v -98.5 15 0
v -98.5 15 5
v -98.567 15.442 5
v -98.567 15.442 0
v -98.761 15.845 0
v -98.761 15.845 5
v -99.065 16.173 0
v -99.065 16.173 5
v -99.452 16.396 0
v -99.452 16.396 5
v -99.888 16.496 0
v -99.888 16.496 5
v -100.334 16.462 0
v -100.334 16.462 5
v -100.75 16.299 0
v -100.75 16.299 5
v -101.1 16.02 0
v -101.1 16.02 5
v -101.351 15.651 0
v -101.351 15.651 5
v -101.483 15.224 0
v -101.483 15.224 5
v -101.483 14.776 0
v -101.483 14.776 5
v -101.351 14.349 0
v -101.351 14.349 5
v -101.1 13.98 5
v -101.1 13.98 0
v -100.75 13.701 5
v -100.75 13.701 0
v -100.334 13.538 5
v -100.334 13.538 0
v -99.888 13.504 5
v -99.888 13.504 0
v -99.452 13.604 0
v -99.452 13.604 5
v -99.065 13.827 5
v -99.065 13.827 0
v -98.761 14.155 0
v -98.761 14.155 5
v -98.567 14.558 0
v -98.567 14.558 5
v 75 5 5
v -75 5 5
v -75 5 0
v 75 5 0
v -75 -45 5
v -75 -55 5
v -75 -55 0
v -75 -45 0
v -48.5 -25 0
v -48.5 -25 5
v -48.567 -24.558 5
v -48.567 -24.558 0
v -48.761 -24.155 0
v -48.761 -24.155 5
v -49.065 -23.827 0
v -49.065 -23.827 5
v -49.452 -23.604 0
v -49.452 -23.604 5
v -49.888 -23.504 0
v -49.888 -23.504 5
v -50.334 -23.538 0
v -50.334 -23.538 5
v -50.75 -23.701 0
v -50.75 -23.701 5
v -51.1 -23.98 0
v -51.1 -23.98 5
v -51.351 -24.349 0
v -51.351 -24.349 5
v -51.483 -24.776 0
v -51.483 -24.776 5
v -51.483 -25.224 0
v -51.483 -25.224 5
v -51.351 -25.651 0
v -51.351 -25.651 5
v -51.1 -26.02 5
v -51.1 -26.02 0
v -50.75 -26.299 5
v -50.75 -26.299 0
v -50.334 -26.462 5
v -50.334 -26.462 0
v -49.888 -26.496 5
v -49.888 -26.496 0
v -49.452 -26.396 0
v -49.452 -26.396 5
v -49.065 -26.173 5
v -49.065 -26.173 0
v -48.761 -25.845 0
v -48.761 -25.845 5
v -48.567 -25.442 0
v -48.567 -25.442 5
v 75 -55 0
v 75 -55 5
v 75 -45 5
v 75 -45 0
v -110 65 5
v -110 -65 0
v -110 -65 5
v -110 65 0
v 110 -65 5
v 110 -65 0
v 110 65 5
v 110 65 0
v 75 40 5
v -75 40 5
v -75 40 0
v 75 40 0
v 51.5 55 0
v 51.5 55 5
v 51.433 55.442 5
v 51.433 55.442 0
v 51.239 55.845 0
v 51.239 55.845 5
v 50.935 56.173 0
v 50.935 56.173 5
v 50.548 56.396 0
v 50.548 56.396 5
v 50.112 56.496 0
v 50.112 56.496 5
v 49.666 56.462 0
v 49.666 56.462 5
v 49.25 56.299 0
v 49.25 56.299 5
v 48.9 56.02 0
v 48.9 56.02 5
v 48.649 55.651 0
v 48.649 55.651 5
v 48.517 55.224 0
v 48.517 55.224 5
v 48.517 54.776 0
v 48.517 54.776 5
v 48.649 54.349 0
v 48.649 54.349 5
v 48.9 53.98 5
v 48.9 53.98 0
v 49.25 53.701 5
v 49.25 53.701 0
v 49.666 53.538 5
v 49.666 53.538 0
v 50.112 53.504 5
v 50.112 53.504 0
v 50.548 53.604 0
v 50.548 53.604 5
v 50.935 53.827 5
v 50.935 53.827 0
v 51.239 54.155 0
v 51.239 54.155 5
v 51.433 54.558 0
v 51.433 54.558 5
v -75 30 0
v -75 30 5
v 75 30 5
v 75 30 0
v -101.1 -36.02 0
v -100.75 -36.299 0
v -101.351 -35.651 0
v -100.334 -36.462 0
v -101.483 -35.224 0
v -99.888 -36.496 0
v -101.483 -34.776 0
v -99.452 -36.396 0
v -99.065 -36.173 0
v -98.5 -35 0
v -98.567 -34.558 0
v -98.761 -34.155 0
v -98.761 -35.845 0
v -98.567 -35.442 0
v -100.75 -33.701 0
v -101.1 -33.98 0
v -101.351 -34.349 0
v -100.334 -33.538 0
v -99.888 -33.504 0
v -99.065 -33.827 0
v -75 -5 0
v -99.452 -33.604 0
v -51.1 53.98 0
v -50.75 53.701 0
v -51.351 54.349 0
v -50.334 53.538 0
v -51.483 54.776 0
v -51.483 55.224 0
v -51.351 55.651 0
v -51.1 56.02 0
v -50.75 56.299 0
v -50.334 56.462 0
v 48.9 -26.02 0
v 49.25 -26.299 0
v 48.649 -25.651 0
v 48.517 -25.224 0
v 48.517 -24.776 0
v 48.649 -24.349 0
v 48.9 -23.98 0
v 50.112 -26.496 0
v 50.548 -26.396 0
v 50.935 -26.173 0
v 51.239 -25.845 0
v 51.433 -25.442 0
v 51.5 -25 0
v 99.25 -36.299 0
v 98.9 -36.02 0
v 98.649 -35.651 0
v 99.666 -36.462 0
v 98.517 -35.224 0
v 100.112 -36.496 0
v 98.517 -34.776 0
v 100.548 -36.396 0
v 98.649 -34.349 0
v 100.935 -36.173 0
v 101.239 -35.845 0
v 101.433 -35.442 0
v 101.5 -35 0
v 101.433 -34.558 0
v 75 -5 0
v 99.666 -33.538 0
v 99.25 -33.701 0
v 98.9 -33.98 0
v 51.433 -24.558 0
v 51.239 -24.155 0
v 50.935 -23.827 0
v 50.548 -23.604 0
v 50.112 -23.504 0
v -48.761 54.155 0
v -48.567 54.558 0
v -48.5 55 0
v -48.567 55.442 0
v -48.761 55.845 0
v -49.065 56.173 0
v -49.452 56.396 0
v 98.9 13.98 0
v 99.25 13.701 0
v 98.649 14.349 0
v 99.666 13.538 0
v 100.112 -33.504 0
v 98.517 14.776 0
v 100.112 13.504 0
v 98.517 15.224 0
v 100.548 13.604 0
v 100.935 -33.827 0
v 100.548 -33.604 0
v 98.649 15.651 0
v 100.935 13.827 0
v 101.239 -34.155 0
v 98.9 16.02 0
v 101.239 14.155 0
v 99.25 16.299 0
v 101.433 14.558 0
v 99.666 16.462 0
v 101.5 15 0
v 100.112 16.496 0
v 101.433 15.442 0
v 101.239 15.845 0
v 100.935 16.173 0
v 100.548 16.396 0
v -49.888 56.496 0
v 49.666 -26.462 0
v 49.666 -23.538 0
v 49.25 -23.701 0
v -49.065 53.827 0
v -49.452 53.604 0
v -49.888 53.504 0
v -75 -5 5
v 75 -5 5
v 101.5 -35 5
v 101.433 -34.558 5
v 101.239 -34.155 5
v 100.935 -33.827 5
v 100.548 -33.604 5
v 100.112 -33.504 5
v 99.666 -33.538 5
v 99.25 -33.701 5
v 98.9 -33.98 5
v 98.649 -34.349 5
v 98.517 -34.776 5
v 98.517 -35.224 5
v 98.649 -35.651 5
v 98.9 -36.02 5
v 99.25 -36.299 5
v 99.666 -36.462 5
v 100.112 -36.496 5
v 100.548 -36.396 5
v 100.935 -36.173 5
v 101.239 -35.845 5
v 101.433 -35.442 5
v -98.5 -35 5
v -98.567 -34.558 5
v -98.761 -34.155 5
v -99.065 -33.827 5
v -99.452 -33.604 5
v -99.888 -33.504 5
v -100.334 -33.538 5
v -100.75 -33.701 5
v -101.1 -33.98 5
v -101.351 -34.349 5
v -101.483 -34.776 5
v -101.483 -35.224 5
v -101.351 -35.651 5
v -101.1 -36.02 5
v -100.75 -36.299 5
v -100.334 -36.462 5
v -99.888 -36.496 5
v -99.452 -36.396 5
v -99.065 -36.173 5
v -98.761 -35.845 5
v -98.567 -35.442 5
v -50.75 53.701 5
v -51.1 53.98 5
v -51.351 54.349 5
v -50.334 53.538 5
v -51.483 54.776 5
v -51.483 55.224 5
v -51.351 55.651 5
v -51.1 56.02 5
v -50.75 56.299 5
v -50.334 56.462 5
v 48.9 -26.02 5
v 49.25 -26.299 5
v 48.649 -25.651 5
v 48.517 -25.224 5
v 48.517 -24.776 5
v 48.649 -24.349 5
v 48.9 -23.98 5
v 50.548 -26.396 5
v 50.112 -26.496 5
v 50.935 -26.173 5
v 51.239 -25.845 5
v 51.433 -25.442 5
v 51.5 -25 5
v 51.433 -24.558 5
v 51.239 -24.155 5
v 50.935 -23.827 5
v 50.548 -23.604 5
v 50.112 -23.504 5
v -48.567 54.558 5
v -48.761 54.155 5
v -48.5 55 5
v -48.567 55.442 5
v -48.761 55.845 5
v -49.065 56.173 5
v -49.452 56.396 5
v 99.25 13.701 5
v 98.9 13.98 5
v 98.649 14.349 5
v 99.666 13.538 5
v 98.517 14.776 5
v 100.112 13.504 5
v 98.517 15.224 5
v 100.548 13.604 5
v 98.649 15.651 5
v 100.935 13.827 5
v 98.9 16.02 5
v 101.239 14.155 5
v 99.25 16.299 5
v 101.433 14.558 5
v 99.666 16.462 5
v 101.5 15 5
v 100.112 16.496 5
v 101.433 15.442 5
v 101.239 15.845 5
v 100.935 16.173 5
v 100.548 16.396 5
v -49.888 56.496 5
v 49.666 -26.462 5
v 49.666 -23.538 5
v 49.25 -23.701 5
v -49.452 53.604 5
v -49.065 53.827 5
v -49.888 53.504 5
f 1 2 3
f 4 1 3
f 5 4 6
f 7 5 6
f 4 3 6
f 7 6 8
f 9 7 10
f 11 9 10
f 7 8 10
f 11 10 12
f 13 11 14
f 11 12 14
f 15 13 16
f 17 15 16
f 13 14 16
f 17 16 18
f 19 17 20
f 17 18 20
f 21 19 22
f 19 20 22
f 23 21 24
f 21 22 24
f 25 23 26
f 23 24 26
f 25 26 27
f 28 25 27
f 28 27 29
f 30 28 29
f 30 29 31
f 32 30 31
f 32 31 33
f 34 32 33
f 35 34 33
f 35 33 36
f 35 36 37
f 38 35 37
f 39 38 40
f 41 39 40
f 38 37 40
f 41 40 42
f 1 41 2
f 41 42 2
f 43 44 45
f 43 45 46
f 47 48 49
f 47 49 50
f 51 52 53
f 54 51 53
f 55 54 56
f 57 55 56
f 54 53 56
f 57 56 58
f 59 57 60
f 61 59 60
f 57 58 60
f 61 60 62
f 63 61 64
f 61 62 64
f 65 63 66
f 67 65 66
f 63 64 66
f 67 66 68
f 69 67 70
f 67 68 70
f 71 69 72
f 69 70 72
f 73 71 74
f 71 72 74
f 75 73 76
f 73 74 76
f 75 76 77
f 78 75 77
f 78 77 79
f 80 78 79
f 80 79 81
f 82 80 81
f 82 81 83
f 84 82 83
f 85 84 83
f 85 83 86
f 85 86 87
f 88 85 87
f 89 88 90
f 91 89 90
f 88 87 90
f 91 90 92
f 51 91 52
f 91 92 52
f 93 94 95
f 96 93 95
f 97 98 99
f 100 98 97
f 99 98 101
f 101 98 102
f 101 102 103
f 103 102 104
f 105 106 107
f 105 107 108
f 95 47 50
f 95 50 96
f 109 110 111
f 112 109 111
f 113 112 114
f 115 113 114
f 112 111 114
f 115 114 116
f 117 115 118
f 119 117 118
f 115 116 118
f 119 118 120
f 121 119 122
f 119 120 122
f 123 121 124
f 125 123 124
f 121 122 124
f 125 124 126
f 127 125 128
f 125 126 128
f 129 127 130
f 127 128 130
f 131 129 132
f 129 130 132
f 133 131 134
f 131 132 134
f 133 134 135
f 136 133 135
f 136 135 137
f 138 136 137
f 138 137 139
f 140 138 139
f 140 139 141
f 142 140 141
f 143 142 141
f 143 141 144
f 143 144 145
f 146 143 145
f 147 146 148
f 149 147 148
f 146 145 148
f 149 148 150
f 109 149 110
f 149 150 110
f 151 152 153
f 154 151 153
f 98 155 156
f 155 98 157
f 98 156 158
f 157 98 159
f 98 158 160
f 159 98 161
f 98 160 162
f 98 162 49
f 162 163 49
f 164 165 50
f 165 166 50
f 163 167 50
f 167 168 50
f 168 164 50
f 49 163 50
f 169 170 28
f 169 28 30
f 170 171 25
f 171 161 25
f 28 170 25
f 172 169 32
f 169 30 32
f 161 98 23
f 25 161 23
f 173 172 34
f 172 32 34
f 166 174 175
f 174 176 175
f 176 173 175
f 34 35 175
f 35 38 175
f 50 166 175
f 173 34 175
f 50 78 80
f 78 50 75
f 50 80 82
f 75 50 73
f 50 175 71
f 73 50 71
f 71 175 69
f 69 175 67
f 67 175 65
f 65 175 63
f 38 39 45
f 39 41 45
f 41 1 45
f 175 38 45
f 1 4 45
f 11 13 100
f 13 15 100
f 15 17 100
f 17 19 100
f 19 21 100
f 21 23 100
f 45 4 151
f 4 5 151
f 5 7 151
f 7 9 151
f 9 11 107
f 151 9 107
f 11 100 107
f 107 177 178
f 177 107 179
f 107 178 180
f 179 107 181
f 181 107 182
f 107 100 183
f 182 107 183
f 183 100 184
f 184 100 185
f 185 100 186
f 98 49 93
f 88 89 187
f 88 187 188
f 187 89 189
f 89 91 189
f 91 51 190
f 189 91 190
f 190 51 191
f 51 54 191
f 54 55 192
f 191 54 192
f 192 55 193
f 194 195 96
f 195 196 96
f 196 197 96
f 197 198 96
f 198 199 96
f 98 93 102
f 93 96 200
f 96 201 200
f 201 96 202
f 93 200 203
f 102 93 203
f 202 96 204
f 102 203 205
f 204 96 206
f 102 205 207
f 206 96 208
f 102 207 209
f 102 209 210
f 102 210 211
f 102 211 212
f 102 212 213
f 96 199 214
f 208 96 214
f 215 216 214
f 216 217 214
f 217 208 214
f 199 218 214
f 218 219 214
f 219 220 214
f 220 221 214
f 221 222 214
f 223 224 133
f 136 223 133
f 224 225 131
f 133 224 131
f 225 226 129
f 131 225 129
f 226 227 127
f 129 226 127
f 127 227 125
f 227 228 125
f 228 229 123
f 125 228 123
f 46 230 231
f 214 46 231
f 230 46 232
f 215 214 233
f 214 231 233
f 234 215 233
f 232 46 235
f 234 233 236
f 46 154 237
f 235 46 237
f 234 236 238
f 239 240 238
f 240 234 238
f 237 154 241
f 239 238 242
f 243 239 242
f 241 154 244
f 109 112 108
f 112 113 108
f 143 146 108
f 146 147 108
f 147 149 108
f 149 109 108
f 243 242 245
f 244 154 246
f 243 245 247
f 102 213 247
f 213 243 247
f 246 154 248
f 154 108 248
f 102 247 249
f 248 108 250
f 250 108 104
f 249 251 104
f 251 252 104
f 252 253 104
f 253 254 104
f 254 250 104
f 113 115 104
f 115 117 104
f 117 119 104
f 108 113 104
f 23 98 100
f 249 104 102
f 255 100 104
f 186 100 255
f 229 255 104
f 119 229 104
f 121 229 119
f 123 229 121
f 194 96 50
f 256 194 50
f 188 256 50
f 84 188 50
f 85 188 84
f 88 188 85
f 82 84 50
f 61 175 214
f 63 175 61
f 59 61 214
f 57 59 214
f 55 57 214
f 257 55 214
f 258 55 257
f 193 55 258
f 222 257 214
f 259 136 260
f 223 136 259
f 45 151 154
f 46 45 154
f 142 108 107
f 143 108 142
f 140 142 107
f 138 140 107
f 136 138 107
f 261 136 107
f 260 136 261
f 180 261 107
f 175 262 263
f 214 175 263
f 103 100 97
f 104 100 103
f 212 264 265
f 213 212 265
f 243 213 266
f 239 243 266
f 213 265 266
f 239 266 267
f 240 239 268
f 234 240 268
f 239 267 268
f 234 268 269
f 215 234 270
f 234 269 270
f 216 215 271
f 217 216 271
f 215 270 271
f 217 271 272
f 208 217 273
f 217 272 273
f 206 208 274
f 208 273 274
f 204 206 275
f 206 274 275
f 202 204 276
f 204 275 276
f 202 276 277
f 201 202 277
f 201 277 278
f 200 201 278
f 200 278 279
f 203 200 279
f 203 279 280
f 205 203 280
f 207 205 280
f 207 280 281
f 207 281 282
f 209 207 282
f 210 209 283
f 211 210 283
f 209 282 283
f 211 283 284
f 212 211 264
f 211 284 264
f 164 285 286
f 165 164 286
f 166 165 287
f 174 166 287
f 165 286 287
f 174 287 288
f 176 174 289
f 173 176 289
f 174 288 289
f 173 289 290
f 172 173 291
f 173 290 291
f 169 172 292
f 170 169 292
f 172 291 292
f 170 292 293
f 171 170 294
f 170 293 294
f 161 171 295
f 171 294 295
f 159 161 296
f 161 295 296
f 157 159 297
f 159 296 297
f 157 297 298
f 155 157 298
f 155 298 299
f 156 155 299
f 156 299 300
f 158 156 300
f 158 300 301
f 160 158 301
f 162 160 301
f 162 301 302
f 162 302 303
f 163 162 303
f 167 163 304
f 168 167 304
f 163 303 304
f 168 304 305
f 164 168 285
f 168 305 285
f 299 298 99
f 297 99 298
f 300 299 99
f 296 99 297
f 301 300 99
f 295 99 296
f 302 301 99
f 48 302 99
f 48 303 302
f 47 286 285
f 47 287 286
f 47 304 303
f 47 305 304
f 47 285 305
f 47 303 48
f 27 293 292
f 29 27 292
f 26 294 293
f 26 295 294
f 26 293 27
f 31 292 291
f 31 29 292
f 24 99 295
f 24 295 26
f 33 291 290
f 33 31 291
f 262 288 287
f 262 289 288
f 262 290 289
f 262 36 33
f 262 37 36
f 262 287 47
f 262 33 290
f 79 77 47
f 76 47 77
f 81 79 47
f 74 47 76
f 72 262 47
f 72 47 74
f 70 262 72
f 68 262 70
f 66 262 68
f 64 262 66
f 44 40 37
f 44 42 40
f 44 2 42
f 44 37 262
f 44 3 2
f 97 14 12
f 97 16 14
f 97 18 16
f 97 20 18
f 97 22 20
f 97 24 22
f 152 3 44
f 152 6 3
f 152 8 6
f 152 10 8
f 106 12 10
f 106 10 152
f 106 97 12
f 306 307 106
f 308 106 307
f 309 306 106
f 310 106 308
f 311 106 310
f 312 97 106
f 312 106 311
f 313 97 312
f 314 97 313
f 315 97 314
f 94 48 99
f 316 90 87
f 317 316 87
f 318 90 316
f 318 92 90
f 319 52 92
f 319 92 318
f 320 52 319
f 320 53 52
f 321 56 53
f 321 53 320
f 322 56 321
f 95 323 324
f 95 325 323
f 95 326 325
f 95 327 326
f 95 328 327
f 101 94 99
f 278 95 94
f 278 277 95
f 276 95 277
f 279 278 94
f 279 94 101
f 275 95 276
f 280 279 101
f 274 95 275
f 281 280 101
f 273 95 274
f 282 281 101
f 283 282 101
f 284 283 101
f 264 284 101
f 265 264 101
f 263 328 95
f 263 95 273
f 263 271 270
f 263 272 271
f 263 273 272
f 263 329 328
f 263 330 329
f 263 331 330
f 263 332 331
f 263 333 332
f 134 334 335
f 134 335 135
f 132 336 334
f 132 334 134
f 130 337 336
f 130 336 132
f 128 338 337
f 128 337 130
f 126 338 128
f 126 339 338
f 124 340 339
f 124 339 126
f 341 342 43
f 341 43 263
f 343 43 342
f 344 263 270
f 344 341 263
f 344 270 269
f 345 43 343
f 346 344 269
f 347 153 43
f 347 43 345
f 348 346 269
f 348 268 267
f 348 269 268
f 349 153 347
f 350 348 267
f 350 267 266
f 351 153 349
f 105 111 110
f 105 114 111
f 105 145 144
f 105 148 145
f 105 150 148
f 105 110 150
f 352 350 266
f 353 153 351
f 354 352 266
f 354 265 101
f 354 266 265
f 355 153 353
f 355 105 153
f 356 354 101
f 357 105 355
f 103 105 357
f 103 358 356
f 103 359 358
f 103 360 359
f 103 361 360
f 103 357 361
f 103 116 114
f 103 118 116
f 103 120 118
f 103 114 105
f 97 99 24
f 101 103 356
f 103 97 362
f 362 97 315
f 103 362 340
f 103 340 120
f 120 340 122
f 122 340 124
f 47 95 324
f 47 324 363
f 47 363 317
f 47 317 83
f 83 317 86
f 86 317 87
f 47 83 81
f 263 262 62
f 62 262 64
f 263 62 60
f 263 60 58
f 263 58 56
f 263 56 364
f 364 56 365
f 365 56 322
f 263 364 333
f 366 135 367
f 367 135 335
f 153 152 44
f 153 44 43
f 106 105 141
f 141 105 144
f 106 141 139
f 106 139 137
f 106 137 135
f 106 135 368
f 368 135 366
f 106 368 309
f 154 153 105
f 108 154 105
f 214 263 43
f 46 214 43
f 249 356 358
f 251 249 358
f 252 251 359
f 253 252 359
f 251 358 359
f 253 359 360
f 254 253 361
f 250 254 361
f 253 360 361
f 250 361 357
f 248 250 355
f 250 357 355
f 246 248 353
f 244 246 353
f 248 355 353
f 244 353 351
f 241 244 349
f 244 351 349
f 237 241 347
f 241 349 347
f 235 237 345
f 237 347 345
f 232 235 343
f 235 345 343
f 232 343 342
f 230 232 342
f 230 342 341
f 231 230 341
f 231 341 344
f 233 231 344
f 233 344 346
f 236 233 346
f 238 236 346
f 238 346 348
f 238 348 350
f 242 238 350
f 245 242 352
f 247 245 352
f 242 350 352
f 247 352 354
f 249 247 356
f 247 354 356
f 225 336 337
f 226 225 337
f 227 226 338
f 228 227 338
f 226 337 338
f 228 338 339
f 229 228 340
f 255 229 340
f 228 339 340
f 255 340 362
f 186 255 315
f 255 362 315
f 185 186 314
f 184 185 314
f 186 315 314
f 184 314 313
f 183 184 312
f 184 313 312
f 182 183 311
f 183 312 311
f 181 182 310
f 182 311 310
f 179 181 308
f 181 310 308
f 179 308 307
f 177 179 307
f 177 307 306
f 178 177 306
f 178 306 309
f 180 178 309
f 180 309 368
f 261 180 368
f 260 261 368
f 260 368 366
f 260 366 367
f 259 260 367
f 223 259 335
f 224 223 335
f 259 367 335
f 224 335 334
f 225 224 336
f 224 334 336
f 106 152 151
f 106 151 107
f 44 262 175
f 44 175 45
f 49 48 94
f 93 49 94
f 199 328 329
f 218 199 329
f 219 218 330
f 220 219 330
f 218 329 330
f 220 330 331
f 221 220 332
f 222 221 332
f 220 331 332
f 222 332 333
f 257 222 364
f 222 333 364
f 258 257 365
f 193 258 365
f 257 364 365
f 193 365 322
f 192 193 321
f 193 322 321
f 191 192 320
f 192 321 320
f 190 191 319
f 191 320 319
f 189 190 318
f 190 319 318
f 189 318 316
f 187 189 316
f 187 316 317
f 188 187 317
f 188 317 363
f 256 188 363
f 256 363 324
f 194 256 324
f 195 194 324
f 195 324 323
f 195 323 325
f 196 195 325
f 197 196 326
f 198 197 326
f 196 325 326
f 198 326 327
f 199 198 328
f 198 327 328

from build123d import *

# Parameters (mm, degrees)
SKETCH_1_W          = 220
SKETCH_1_H          = 130
EXTRUDE_1_DEPTH     = 5
SKETCH_2_R          = 1.5
CUT_EXTRUDE_1_DEPTH = 5
SKETCH_3_R          = 1.5
CUT_EXTRUDE_2_DEPTH = 5
SKETCH_4_W          = 150
SKETCH_4_H          = 10
CUT_EXTRUDE_3_DEPTH = 10


with BuildPart() as part:
    # 草图1 → 凸台-拉伸1 (new body)
    with BuildSketch(Plane.XY):
        Rectangle(SKETCH_1_W, SKETCH_1_H)
    extrude(amount=EXTRUDE_1_DEPTH)

    # 草图2 → 切除-拉伸1 (cut)
    with BuildSketch(Plane.XY.offset(5)):
        with Locations((-50, 55)):
            Circle(SKETCH_2_R)
        with Locations((50, 55)):
            Circle(SKETCH_2_R)
        with Locations((50, -25)):
            Circle(SKETCH_2_R)
        with Locations((-50, -25)):
            Circle(SKETCH_2_R)
    extrude(amount=-CUT_EXTRUDE_1_DEPTH, mode=Mode.SUBTRACT)

    # 草图3 → 切除-拉伸2 (cut)
    with BuildSketch(Plane.XY.offset(5)):
        with Locations((100, 15)):
            Circle(SKETCH_3_R)
        with Locations((100, -35)):
            Circle(SKETCH_3_R)
        with Locations((-100, 15)):
            Circle(SKETCH_3_R)
        with Locations((-100, -35)):
            Circle(SKETCH_3_R)
    extrude(amount=-CUT_EXTRUDE_2_DEPTH, mode=Mode.SUBTRACT)

    # 草图4 → 切除-拉伸3 (cut)
    with BuildSketch(Plane.XY.offset(5)):
        Rectangle(SKETCH_4_W, SKETCH_4_H)
        with Locations((0, 35)):
            Rectangle(SKETCH_4_W, SKETCH_4_H)
        with Locations((0, -50)):
            Rectangle(SKETCH_4_W, SKETCH_4_H)
    extrude(amount=-CUT_EXTRUDE_3_DEPTH, mode=Mode.SUBTRACT)


solid = part.part
